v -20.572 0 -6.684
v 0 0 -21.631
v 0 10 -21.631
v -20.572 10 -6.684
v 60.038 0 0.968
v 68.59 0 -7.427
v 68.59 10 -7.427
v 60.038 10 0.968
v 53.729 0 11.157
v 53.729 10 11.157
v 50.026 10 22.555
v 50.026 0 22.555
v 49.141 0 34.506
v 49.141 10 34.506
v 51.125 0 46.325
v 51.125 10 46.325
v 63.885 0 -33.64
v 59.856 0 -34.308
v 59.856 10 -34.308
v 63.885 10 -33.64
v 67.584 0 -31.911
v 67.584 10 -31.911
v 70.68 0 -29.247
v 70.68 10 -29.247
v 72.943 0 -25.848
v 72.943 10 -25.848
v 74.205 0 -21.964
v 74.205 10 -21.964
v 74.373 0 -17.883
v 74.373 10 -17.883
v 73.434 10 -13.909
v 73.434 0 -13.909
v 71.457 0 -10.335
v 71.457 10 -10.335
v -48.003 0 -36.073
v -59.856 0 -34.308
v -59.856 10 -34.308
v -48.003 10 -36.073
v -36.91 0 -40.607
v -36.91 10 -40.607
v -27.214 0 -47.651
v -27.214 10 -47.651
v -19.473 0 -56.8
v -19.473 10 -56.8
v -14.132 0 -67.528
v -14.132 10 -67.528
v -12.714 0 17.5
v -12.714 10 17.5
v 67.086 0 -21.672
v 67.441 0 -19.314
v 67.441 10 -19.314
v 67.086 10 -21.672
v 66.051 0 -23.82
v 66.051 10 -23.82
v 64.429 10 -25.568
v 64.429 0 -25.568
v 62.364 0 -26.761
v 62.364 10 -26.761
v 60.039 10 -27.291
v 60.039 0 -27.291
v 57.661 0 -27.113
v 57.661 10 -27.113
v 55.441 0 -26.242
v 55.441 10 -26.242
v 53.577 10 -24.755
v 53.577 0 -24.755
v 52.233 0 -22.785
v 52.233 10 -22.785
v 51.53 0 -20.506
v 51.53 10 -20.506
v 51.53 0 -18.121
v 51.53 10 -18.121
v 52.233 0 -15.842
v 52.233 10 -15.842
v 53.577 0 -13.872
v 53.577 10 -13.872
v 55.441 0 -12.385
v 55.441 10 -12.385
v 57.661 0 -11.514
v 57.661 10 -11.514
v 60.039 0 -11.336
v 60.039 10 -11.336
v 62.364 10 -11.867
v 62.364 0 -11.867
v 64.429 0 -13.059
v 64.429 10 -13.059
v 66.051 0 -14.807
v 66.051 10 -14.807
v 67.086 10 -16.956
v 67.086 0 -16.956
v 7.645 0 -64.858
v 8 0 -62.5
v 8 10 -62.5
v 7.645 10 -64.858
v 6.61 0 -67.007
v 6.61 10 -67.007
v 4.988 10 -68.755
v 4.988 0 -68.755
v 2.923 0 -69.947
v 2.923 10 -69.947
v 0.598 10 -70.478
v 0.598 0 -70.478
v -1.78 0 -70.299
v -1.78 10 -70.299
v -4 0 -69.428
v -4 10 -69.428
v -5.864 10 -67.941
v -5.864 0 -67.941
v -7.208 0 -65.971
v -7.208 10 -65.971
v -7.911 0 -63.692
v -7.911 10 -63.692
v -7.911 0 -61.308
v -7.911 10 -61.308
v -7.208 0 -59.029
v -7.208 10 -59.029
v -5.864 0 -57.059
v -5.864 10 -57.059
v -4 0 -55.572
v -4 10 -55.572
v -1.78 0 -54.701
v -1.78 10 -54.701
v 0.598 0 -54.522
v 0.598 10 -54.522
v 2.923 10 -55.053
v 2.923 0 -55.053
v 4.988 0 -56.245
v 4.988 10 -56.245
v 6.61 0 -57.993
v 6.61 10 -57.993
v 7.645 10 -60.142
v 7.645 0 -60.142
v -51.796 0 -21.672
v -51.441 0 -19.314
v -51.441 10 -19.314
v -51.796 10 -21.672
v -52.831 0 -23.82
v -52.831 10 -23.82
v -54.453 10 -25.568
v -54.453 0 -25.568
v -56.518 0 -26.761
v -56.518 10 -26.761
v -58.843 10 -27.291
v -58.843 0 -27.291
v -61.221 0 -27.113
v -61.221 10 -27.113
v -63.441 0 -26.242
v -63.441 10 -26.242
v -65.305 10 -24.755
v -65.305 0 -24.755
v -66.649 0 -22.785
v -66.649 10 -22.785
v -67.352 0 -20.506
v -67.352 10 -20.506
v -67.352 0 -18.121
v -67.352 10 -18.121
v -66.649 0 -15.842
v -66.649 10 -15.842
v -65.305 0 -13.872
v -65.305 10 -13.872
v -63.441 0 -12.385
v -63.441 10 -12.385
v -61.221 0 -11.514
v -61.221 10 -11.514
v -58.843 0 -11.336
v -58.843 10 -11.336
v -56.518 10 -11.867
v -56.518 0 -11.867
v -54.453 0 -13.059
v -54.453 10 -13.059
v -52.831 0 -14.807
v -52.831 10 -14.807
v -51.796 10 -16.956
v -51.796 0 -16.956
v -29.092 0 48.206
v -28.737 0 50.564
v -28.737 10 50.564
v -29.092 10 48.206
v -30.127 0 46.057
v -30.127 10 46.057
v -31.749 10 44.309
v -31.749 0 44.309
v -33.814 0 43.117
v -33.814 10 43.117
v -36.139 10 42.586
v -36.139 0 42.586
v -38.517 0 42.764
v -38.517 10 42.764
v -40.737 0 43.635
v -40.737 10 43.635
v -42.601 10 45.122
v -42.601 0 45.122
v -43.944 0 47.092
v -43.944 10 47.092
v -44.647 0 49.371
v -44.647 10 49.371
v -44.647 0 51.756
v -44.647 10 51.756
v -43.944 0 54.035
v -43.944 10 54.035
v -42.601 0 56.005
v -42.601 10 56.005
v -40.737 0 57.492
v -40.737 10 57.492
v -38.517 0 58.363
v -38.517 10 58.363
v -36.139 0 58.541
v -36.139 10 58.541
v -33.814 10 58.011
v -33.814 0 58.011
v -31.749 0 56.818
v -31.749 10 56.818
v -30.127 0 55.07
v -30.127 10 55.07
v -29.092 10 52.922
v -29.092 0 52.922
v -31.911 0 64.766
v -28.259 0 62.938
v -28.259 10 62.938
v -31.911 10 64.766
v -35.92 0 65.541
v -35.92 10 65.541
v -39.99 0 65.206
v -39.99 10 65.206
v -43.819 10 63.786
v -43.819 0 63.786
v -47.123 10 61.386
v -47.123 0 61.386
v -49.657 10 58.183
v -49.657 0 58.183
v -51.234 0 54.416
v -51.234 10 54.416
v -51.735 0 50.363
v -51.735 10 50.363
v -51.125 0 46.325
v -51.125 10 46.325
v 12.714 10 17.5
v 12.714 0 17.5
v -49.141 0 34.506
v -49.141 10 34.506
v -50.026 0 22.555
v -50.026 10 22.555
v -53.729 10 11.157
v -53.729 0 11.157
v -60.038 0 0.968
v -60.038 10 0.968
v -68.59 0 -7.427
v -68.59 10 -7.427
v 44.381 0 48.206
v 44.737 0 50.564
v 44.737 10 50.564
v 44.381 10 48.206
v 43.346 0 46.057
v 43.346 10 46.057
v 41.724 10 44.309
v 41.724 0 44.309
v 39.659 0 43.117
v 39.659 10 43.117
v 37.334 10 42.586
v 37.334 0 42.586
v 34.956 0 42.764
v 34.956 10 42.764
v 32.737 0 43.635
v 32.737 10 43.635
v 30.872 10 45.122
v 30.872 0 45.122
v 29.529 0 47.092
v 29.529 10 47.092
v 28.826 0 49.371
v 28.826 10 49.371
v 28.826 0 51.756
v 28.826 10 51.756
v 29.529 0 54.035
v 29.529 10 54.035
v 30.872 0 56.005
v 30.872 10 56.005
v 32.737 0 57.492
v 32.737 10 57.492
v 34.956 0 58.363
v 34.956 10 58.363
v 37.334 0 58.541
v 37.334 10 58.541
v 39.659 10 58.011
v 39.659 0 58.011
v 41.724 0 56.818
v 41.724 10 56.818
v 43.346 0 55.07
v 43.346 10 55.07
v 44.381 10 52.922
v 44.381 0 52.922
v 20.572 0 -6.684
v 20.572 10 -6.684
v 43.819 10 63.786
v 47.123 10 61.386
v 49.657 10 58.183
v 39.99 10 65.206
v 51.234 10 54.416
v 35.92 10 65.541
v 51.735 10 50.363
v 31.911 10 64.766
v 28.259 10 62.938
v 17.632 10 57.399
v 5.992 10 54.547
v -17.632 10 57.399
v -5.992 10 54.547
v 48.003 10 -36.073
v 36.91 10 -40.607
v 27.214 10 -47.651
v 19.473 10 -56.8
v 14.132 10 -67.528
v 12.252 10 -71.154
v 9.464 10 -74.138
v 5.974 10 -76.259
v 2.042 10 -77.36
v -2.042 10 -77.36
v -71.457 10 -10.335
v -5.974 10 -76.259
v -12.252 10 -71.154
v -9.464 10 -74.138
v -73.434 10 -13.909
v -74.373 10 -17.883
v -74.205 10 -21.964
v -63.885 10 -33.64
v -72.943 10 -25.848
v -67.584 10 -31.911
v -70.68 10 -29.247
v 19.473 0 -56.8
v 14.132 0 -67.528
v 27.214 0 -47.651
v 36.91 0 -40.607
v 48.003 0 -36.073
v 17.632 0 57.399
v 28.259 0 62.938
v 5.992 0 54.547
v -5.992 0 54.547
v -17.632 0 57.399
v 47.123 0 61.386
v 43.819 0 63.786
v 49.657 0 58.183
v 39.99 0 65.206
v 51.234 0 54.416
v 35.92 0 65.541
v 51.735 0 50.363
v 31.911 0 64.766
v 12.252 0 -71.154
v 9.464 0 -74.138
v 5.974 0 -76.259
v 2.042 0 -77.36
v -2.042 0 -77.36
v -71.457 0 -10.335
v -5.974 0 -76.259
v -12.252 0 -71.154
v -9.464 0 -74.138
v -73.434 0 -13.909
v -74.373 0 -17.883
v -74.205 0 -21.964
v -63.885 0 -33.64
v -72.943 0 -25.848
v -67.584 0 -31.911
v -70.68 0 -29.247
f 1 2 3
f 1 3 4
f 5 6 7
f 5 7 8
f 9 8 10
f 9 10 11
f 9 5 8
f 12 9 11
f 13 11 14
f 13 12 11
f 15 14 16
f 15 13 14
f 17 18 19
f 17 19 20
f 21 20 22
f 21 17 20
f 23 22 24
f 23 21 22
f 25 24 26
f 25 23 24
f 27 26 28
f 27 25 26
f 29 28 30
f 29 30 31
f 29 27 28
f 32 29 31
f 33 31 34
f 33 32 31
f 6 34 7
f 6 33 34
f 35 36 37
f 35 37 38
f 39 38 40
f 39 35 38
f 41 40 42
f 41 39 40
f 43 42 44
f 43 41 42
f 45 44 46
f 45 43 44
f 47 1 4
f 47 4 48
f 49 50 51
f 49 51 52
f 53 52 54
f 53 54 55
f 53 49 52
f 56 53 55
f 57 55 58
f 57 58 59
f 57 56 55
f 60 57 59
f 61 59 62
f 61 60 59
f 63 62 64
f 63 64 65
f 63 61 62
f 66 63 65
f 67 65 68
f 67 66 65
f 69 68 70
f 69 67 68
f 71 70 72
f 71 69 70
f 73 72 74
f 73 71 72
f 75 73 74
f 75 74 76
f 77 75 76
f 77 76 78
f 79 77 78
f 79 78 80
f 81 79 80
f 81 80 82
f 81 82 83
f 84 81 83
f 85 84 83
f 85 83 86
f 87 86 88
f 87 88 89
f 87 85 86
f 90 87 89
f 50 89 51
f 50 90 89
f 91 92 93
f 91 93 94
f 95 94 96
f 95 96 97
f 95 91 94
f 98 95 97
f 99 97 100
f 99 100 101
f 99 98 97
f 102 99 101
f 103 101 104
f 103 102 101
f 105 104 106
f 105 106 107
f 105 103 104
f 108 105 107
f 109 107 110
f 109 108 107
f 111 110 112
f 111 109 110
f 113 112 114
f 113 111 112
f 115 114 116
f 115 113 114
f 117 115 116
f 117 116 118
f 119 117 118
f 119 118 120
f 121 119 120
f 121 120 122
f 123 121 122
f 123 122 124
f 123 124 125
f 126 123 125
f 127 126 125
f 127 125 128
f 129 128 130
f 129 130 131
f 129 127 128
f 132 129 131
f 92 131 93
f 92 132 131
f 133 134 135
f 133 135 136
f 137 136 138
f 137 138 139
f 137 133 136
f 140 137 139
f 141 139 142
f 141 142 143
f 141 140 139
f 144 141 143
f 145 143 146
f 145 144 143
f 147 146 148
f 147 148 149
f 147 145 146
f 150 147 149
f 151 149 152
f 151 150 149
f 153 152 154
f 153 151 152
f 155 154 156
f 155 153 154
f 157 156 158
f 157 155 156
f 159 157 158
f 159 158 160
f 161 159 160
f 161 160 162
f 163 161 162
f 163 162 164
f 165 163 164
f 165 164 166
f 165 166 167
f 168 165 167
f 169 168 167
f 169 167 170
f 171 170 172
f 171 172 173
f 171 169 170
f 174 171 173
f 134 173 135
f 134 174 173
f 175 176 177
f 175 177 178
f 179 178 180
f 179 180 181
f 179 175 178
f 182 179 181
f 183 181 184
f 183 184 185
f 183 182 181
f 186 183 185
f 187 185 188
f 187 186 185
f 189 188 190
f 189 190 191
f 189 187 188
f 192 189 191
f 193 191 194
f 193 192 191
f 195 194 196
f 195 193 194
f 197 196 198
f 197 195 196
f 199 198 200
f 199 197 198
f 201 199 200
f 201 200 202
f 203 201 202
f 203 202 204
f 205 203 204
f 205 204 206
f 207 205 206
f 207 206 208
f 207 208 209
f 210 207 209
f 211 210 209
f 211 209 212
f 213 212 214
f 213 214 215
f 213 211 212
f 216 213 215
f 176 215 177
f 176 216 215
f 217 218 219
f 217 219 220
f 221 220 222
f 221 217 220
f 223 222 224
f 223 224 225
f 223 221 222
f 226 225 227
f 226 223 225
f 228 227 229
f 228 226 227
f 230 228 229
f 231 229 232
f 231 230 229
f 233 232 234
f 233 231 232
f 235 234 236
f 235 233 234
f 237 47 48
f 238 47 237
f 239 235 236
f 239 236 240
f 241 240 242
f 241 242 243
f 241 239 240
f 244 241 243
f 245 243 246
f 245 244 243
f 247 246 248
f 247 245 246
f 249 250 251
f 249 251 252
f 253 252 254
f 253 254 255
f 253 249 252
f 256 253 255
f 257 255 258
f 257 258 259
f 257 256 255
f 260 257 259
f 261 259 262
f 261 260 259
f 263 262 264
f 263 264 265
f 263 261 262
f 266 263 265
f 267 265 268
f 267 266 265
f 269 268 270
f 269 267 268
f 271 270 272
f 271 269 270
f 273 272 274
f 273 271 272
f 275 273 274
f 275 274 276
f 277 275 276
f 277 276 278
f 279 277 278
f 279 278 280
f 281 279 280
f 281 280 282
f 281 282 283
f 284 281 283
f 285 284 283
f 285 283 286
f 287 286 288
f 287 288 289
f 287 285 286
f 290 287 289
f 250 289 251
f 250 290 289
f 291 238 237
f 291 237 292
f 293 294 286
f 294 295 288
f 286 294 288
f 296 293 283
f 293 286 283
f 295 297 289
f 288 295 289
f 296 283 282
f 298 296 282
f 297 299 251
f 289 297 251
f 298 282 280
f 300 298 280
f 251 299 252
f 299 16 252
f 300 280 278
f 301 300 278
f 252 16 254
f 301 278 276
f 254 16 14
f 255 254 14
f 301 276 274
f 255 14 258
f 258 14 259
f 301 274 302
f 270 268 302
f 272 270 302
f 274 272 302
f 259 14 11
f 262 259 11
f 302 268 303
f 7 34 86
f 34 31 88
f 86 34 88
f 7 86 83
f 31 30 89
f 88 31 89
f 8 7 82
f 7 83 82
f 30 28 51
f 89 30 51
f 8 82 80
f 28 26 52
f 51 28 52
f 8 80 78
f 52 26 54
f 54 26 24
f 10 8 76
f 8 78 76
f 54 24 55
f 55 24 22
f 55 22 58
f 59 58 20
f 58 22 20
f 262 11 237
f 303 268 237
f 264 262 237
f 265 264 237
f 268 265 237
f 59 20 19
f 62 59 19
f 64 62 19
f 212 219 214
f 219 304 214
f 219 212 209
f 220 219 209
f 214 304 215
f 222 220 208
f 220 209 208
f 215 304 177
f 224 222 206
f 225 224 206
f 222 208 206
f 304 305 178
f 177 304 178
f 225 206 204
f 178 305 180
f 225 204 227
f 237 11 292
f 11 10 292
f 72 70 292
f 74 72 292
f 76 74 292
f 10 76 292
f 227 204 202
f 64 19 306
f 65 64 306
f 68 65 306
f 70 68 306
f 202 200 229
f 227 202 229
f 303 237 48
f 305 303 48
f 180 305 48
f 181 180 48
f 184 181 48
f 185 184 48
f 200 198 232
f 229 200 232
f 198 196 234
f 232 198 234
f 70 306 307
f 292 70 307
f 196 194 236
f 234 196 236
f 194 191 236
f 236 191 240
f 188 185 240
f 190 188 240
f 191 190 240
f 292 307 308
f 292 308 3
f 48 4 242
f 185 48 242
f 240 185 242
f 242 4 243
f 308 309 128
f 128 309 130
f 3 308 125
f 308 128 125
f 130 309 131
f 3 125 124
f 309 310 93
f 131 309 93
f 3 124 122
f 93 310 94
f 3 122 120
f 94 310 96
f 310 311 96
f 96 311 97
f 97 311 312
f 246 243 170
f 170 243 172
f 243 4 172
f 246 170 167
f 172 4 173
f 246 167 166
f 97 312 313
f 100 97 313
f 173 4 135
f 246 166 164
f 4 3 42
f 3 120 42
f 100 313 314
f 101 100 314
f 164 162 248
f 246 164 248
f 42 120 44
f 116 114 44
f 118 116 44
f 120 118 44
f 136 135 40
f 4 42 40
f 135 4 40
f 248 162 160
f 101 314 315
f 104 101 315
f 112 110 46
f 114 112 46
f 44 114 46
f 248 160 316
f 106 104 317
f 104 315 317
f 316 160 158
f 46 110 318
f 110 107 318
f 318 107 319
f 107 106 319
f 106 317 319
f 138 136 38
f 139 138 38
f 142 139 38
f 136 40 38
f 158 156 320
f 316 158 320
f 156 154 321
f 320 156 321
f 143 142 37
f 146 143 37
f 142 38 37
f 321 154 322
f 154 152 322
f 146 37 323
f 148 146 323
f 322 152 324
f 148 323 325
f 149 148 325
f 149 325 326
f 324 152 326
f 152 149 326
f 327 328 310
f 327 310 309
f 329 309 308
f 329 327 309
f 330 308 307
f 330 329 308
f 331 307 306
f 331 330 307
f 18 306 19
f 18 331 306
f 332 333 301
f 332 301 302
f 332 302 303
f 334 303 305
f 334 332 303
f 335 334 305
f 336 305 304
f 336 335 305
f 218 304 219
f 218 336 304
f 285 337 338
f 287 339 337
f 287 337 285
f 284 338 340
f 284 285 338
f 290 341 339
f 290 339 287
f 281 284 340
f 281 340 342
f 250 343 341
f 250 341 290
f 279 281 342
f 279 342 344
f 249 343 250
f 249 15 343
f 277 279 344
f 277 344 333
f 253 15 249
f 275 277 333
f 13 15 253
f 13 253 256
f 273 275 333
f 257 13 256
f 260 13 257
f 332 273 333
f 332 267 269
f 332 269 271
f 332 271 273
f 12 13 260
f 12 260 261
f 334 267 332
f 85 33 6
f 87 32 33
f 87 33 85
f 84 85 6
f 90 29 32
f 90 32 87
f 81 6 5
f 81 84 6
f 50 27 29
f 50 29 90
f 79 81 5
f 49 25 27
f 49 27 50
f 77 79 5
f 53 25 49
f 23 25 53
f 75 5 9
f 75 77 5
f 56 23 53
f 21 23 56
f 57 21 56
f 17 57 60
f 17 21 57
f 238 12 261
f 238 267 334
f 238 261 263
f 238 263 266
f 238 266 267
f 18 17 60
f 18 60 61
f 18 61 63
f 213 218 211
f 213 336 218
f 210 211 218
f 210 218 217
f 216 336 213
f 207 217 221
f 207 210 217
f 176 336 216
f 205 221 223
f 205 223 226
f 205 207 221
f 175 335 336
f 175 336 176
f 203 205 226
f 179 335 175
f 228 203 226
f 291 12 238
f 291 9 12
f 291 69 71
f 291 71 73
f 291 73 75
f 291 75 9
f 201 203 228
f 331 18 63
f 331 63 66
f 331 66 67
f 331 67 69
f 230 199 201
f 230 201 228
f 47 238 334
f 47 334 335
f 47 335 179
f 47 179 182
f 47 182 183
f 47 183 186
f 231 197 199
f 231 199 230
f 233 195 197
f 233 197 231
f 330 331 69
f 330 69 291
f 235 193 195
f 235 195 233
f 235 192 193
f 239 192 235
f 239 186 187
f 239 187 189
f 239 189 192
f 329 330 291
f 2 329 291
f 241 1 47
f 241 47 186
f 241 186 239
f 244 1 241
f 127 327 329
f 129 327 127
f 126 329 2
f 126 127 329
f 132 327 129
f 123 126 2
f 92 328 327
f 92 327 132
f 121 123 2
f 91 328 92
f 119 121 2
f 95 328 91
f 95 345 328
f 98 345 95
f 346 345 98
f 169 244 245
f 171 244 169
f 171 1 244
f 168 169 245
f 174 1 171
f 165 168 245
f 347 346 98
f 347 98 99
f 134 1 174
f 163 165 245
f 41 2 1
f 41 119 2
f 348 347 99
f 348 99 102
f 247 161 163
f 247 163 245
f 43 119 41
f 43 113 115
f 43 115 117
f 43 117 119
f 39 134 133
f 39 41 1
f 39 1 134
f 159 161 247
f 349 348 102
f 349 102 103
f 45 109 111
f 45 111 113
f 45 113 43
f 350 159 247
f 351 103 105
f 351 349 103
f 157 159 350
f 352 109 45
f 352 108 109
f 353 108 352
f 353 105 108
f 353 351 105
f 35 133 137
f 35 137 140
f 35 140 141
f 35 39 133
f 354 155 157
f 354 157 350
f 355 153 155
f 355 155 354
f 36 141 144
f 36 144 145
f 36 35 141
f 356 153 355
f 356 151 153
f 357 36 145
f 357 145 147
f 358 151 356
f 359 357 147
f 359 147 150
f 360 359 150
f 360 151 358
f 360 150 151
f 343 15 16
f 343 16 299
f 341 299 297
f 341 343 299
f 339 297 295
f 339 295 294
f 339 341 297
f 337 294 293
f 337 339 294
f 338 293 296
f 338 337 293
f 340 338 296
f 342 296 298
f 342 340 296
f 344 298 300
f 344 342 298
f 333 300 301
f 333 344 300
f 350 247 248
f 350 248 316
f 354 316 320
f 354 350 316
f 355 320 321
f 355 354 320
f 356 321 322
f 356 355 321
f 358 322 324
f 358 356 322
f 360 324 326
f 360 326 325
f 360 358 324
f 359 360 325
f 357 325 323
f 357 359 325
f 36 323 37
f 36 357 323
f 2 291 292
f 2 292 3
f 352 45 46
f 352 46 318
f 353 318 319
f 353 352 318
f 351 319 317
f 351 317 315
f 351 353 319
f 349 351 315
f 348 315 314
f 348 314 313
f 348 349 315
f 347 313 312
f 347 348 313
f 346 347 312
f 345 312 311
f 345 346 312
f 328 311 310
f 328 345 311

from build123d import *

# Parameters (mm, degrees)
SKETCH1_R           = 8
BOSS_EXTRUDE3_DEPTH = 10


with BuildPart() as part:
    # Sketch1 → Boss-Extrude3 (new body)
    with BuildSketch(Plane(origin=(0, 0, 0), x_dir=(1, 0, 0), z_dir=(0, 1, 0))):
        with BuildLine():
            ThreePointArc((14.132148934, 67.528157367), (31.850049433, 43.837832205), (59.85601991, 34.307820558))
            ThreePointArc((59.85601991, 34.307820558), (73.706880013, 23.948817064), (68.590168285, 7.426875892))
            ThreePointArc((68.590168285, 7.426875892), (51.534462525, -16.744561909), (51.125203669, -46.324758182))
            ThreePointArc((51.125203669, -46.324758182), (45.553357053, -62.698817064), (28.25890636, -62.938095635))
            ThreePointArc((28.25890636, -62.938095635), (0, -54.186540592), (-28.25890636, -62.938095635))
            ThreePointArc((-28.25890636, -62.938095635), (-45.553357053, -62.698817064), (-51.125203669, -46.324758182))
            ThreePointArc((-51.125203669, -46.324758182), (-51.534462525, -16.744561909), (-68.590168285, 7.426875892))
            ThreePointArc((-68.590168285, 7.426875892), (-73.706880013, 23.948817064), (-59.85601991, 34.307820558))
            ThreePointArc((-59.85601991, 34.307820558), (-31.850049433, 43.837832205), (-14.132148934, 67.528157367))
            ThreePointArc((-14.132148934, 67.528157367), (0, 77.5), (14.132148934, 67.528157367))
        make_face()
        with Locations((36.736578268, -50.563562148)):
            Circle(SKETCH1_R, mode=Mode.SUBTRACT)
        with Locations((-36.736578268, -50.563562148)):
            Circle(SKETCH1_R, mode=Mode.SUBTRACT)
        with Locations((59.441032268, 19.313562148)):
            Circle(SKETCH1_R, mode=Mode.SUBTRACT)
        with Locations((-59.441032268, 19.313562148)):
            Circle(SKETCH1_R, mode=Mode.SUBTRACT)
        with Locations((0, 62.5)):
            Circle(SKETCH1_R, mode=Mode.SUBTRACT)
        Polygon((20.57248383, 6.684405197), (0, 21.631189606), (-20.57248383, 6.684405197), (-12.71449424, -17.5), (12.71449424, -17.5), align=None, mode=Mode.SUBTRACT)
    extrude(amount=BOSS_EXTRUDE3_DEPTH)


solid = part.part
